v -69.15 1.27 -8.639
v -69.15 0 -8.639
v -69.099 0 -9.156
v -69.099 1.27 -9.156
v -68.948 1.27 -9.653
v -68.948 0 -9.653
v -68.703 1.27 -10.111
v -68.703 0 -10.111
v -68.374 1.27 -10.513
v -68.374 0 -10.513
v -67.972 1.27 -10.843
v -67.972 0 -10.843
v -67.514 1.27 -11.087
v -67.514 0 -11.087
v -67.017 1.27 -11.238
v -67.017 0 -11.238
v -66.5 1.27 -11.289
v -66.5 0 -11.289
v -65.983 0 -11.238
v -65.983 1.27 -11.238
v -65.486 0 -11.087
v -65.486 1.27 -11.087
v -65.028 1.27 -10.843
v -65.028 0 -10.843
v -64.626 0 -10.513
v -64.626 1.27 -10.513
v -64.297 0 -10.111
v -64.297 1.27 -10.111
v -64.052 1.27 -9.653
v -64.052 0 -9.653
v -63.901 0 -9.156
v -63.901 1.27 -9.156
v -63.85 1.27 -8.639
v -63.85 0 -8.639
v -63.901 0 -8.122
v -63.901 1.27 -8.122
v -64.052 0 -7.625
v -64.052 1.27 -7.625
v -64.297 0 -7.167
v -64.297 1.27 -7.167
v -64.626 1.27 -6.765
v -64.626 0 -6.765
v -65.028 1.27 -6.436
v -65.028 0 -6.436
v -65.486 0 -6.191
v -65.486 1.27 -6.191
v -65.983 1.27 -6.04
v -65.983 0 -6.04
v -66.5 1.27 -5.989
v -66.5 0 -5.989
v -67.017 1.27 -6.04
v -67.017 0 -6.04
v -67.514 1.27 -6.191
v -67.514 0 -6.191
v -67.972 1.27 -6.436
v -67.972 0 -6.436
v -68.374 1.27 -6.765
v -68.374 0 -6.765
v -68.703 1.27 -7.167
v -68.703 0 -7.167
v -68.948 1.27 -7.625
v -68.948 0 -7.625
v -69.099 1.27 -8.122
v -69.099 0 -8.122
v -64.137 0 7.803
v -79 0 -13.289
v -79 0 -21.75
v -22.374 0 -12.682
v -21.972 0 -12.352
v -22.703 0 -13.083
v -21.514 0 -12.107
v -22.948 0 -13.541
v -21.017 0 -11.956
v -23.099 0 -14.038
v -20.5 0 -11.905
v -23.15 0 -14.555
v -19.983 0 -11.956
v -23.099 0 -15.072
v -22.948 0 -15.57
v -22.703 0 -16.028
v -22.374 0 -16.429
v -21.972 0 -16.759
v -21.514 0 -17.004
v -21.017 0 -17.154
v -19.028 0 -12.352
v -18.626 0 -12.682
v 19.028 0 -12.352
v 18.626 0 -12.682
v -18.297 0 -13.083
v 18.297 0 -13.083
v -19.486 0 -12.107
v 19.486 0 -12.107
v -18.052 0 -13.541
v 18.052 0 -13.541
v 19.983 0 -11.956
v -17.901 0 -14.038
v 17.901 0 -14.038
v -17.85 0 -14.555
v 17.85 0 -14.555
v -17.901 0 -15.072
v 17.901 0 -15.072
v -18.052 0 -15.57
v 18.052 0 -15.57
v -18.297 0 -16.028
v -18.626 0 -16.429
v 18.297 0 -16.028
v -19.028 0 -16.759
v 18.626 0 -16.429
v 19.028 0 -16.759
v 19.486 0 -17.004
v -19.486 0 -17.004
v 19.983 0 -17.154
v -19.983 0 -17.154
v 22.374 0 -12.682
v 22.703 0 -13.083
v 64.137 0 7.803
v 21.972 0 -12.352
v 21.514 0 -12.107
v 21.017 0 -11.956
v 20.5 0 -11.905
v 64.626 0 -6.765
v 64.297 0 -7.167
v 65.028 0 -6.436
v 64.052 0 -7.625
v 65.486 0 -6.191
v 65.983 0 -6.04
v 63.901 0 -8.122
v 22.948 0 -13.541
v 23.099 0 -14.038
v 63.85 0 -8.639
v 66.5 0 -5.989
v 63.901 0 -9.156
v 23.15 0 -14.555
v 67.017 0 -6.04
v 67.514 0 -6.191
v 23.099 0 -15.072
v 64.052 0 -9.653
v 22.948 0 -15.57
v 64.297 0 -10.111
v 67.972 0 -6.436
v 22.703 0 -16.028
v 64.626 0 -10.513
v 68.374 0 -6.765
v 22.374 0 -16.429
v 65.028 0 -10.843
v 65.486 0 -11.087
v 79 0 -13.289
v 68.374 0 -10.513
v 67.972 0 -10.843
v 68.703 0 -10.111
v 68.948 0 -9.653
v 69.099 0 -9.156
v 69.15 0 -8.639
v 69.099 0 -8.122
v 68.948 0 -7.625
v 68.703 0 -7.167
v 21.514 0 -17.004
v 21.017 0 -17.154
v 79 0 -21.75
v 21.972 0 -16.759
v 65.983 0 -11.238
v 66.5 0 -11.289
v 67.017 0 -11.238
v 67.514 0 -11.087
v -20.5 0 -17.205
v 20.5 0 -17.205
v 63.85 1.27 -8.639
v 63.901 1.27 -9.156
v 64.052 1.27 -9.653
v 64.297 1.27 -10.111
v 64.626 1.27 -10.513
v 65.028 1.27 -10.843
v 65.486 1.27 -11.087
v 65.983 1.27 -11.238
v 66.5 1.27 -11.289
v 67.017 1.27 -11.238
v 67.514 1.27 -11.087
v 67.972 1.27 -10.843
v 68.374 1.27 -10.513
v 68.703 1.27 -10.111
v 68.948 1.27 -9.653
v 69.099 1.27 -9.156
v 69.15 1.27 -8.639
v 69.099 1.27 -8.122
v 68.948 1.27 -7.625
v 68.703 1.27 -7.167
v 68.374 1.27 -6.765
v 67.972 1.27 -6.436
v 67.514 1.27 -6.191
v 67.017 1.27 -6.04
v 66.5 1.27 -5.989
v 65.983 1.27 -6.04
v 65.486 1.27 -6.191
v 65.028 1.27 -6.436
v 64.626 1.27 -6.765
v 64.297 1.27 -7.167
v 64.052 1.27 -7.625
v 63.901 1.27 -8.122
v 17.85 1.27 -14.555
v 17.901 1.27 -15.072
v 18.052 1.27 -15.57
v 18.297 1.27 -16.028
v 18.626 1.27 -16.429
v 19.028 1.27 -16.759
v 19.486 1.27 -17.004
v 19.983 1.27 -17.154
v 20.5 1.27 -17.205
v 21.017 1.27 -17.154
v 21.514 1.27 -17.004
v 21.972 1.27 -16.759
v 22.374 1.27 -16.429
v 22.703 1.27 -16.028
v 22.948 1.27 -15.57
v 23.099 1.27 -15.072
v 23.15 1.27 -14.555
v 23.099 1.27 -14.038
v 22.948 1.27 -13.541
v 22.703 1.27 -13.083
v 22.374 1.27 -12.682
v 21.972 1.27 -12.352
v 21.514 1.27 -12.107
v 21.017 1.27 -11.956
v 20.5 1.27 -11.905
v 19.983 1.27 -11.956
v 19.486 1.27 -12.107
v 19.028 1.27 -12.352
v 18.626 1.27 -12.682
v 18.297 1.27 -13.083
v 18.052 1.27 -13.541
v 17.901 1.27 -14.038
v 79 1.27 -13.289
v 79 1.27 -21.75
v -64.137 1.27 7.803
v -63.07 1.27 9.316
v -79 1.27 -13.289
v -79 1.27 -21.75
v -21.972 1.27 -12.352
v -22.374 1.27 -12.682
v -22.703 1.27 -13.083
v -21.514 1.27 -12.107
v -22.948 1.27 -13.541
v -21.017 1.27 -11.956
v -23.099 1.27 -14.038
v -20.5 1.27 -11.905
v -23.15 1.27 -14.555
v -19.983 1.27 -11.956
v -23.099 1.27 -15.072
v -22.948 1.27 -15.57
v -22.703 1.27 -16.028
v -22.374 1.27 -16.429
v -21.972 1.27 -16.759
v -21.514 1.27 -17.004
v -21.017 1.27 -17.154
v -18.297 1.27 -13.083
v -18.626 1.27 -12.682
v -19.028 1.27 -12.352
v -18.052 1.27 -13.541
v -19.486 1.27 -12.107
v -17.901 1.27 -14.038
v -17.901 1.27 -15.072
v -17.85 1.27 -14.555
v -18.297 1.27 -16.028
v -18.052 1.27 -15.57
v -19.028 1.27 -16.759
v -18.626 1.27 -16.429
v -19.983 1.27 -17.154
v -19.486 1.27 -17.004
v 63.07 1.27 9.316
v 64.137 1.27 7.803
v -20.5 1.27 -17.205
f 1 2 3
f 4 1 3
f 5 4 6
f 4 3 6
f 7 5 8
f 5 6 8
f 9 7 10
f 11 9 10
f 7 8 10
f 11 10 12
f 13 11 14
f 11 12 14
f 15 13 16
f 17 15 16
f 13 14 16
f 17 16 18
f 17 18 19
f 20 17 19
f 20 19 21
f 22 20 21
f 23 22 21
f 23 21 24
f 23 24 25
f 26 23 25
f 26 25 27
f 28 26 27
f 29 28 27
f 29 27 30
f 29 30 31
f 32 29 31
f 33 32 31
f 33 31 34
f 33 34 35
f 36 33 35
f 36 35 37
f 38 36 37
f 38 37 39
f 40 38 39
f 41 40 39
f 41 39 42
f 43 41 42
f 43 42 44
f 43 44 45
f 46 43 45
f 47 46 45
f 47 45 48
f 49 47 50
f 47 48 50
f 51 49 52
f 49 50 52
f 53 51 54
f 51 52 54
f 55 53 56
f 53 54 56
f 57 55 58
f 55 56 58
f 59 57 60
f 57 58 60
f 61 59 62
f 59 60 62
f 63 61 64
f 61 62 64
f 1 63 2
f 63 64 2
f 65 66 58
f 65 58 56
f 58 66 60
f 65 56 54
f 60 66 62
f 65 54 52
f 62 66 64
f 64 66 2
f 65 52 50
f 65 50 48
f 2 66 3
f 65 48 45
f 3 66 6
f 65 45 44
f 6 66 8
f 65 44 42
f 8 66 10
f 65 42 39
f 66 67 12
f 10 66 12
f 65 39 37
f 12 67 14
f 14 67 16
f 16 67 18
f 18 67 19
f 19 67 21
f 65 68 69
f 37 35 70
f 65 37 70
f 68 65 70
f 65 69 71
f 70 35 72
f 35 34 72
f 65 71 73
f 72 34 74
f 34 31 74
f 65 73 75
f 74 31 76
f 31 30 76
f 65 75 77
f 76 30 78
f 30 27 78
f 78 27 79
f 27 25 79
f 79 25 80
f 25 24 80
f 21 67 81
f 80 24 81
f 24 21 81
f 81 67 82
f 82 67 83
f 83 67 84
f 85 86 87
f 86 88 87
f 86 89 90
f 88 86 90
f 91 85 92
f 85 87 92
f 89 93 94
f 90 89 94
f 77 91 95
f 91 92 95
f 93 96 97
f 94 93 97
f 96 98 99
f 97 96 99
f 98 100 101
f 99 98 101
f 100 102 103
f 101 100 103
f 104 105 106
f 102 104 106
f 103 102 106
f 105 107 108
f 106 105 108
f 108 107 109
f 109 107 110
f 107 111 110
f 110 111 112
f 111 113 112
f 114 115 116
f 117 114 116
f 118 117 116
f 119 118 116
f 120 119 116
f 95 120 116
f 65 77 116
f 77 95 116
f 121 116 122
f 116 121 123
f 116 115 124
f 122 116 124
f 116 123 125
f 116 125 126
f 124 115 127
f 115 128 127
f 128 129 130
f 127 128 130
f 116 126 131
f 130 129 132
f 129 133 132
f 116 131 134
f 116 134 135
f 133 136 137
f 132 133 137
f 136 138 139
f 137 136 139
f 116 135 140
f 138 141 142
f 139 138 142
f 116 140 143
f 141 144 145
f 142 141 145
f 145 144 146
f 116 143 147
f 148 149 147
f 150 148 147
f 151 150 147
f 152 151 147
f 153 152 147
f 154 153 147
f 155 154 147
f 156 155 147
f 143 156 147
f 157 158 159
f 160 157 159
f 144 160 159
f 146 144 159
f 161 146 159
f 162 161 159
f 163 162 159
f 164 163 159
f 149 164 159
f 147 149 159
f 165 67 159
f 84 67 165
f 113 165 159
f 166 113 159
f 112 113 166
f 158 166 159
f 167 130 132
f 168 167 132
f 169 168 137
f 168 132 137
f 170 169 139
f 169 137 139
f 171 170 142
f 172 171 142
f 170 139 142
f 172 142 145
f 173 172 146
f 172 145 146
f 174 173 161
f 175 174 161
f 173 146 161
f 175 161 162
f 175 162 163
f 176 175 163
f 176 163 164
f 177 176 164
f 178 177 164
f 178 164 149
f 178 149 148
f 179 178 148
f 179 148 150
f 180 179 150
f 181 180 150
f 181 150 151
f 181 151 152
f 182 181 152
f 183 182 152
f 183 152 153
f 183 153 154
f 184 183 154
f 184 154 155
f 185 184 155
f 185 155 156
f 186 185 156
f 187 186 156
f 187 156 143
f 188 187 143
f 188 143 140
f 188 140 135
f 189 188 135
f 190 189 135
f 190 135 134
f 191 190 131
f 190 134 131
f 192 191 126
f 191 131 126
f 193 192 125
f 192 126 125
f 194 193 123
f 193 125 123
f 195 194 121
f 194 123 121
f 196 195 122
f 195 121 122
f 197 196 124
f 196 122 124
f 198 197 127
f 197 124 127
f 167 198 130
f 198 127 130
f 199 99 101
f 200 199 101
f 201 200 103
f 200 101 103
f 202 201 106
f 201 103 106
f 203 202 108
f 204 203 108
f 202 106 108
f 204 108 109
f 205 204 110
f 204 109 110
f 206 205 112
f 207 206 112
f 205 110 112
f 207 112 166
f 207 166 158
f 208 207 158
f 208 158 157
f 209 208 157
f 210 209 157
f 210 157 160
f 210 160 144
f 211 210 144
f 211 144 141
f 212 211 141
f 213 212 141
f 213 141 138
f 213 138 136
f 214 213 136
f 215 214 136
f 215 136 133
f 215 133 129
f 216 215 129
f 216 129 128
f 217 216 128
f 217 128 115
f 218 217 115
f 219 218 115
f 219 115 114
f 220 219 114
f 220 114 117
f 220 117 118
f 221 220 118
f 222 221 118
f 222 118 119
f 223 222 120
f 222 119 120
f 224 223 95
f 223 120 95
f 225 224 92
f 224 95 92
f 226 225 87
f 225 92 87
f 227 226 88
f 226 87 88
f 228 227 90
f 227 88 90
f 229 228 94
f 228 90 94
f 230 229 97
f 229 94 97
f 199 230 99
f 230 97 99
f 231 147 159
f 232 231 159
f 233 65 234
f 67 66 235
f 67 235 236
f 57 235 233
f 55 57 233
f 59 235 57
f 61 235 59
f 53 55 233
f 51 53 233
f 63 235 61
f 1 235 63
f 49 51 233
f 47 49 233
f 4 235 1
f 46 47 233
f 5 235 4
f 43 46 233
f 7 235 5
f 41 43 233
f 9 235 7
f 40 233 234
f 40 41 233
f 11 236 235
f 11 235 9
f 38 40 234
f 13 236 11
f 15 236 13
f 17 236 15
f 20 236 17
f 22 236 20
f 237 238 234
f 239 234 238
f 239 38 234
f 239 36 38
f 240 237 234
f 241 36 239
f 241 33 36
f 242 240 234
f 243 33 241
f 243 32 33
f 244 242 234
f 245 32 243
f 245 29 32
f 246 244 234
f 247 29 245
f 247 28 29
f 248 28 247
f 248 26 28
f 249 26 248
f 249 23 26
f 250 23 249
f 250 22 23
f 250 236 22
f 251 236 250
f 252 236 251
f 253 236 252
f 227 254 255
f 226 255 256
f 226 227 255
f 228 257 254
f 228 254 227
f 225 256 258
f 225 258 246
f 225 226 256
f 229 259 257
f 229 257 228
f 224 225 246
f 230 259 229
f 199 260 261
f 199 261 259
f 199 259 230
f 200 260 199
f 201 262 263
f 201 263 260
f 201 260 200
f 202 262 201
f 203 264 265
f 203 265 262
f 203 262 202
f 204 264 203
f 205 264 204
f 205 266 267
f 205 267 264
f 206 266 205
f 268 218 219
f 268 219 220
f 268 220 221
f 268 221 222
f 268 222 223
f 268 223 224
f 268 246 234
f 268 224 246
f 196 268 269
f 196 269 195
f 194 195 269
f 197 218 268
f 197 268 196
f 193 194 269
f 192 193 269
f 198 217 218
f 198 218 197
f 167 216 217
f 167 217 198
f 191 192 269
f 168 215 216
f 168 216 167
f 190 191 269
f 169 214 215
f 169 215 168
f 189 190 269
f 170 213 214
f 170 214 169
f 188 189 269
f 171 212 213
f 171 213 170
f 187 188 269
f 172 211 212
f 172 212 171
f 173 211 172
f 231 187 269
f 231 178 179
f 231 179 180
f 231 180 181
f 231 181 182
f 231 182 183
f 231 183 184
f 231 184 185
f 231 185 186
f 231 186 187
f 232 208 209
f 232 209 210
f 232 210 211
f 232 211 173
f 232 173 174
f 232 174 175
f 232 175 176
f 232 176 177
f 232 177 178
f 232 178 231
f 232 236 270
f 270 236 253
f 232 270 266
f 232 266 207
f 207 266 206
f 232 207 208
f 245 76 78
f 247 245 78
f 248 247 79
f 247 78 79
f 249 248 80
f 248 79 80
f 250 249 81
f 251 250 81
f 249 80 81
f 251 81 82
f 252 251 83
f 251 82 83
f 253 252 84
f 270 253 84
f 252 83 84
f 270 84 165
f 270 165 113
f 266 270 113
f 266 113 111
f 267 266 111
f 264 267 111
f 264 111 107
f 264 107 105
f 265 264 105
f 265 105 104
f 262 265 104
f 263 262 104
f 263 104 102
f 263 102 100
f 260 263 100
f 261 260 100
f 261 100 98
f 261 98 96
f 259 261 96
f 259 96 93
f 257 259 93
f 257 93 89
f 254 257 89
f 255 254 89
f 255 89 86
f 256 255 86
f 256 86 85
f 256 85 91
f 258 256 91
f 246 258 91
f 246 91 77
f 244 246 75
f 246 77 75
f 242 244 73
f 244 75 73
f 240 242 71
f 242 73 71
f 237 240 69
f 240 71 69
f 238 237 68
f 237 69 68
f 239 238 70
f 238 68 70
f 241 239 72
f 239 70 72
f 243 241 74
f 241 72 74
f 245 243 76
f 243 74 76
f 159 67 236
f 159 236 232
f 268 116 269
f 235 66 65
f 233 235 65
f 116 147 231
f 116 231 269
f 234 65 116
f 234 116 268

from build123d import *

# Parameters (mm, degrees)
SKETCH1_W            = 158
SKETCH1_H            = 43.5
BOSS_EXTRUDE1_DEPTH  = 1.27
CUT_EXTRUDE1_DEPTH   = 159
M5_CLEARANCE_HOLE1_D = 5.3
CUT_EXTRUDE2_DEPTH   = 2.27


with BuildPart() as part:
    # Sketch1 → Boss-Extrude1 (new body)
    with BuildSketch(Plane(origin=(0, 0, 0), x_dir=(1, 0, 0), z_dir=(0, 1, 0))):
        Rectangle(SKETCH1_W, SKETCH1_H)
    extrude(amount=BOSS_EXTRUDE1_DEPTH)

    # Sketch2 → Cut-Extrude1 (cut, through all)
    with BuildSketch(Plane(origin=(79, 0, 0), x_dir=(0, 0, -1), z_dir=(1, 0, 0))):
        Polygon((-22.585561228, 12.404199387), (-22.585561228, -1.620794398), (-5.871224499, -1.620794398), align=None)
    extrude(amount=-CUT_EXTRUDE1_DEPTH, mode=Mode.SUBTRACT)

    # M5 Clearance Hole1 (through all)
    with Locations(Plane(origin=(0, 1.27, 0), x_dir=(1, 0, 0), z_dir=(0, 1, 0))):
        with Locations((-66.5, 8.639185421), (-20.5, 14.555407289), (20.5, 14.555407289), (66.5, 8.639185421)):
            Hole(M5_CLEARANCE_HOLE1_D / 2)

    # Sketch5 → Cut-Extrude2 (cut, through all)
    with BuildSketch(Plane.XZ):
        Polygon((-79, -13.288842768), (-64.136558606, 7.802812046), (-59.820077438, 13.928024129), (-79, 13.928024129), align=None)
        Polygon((64.136558606, 7.802812046), (59.820077438, 13.928024129), (79, 13.928024129), (79, -13.288842768), align=None)
    extrude(amount=-CUT_EXTRUDE2_DEPTH, mode=Mode.SUBTRACT)


solid = part.part
